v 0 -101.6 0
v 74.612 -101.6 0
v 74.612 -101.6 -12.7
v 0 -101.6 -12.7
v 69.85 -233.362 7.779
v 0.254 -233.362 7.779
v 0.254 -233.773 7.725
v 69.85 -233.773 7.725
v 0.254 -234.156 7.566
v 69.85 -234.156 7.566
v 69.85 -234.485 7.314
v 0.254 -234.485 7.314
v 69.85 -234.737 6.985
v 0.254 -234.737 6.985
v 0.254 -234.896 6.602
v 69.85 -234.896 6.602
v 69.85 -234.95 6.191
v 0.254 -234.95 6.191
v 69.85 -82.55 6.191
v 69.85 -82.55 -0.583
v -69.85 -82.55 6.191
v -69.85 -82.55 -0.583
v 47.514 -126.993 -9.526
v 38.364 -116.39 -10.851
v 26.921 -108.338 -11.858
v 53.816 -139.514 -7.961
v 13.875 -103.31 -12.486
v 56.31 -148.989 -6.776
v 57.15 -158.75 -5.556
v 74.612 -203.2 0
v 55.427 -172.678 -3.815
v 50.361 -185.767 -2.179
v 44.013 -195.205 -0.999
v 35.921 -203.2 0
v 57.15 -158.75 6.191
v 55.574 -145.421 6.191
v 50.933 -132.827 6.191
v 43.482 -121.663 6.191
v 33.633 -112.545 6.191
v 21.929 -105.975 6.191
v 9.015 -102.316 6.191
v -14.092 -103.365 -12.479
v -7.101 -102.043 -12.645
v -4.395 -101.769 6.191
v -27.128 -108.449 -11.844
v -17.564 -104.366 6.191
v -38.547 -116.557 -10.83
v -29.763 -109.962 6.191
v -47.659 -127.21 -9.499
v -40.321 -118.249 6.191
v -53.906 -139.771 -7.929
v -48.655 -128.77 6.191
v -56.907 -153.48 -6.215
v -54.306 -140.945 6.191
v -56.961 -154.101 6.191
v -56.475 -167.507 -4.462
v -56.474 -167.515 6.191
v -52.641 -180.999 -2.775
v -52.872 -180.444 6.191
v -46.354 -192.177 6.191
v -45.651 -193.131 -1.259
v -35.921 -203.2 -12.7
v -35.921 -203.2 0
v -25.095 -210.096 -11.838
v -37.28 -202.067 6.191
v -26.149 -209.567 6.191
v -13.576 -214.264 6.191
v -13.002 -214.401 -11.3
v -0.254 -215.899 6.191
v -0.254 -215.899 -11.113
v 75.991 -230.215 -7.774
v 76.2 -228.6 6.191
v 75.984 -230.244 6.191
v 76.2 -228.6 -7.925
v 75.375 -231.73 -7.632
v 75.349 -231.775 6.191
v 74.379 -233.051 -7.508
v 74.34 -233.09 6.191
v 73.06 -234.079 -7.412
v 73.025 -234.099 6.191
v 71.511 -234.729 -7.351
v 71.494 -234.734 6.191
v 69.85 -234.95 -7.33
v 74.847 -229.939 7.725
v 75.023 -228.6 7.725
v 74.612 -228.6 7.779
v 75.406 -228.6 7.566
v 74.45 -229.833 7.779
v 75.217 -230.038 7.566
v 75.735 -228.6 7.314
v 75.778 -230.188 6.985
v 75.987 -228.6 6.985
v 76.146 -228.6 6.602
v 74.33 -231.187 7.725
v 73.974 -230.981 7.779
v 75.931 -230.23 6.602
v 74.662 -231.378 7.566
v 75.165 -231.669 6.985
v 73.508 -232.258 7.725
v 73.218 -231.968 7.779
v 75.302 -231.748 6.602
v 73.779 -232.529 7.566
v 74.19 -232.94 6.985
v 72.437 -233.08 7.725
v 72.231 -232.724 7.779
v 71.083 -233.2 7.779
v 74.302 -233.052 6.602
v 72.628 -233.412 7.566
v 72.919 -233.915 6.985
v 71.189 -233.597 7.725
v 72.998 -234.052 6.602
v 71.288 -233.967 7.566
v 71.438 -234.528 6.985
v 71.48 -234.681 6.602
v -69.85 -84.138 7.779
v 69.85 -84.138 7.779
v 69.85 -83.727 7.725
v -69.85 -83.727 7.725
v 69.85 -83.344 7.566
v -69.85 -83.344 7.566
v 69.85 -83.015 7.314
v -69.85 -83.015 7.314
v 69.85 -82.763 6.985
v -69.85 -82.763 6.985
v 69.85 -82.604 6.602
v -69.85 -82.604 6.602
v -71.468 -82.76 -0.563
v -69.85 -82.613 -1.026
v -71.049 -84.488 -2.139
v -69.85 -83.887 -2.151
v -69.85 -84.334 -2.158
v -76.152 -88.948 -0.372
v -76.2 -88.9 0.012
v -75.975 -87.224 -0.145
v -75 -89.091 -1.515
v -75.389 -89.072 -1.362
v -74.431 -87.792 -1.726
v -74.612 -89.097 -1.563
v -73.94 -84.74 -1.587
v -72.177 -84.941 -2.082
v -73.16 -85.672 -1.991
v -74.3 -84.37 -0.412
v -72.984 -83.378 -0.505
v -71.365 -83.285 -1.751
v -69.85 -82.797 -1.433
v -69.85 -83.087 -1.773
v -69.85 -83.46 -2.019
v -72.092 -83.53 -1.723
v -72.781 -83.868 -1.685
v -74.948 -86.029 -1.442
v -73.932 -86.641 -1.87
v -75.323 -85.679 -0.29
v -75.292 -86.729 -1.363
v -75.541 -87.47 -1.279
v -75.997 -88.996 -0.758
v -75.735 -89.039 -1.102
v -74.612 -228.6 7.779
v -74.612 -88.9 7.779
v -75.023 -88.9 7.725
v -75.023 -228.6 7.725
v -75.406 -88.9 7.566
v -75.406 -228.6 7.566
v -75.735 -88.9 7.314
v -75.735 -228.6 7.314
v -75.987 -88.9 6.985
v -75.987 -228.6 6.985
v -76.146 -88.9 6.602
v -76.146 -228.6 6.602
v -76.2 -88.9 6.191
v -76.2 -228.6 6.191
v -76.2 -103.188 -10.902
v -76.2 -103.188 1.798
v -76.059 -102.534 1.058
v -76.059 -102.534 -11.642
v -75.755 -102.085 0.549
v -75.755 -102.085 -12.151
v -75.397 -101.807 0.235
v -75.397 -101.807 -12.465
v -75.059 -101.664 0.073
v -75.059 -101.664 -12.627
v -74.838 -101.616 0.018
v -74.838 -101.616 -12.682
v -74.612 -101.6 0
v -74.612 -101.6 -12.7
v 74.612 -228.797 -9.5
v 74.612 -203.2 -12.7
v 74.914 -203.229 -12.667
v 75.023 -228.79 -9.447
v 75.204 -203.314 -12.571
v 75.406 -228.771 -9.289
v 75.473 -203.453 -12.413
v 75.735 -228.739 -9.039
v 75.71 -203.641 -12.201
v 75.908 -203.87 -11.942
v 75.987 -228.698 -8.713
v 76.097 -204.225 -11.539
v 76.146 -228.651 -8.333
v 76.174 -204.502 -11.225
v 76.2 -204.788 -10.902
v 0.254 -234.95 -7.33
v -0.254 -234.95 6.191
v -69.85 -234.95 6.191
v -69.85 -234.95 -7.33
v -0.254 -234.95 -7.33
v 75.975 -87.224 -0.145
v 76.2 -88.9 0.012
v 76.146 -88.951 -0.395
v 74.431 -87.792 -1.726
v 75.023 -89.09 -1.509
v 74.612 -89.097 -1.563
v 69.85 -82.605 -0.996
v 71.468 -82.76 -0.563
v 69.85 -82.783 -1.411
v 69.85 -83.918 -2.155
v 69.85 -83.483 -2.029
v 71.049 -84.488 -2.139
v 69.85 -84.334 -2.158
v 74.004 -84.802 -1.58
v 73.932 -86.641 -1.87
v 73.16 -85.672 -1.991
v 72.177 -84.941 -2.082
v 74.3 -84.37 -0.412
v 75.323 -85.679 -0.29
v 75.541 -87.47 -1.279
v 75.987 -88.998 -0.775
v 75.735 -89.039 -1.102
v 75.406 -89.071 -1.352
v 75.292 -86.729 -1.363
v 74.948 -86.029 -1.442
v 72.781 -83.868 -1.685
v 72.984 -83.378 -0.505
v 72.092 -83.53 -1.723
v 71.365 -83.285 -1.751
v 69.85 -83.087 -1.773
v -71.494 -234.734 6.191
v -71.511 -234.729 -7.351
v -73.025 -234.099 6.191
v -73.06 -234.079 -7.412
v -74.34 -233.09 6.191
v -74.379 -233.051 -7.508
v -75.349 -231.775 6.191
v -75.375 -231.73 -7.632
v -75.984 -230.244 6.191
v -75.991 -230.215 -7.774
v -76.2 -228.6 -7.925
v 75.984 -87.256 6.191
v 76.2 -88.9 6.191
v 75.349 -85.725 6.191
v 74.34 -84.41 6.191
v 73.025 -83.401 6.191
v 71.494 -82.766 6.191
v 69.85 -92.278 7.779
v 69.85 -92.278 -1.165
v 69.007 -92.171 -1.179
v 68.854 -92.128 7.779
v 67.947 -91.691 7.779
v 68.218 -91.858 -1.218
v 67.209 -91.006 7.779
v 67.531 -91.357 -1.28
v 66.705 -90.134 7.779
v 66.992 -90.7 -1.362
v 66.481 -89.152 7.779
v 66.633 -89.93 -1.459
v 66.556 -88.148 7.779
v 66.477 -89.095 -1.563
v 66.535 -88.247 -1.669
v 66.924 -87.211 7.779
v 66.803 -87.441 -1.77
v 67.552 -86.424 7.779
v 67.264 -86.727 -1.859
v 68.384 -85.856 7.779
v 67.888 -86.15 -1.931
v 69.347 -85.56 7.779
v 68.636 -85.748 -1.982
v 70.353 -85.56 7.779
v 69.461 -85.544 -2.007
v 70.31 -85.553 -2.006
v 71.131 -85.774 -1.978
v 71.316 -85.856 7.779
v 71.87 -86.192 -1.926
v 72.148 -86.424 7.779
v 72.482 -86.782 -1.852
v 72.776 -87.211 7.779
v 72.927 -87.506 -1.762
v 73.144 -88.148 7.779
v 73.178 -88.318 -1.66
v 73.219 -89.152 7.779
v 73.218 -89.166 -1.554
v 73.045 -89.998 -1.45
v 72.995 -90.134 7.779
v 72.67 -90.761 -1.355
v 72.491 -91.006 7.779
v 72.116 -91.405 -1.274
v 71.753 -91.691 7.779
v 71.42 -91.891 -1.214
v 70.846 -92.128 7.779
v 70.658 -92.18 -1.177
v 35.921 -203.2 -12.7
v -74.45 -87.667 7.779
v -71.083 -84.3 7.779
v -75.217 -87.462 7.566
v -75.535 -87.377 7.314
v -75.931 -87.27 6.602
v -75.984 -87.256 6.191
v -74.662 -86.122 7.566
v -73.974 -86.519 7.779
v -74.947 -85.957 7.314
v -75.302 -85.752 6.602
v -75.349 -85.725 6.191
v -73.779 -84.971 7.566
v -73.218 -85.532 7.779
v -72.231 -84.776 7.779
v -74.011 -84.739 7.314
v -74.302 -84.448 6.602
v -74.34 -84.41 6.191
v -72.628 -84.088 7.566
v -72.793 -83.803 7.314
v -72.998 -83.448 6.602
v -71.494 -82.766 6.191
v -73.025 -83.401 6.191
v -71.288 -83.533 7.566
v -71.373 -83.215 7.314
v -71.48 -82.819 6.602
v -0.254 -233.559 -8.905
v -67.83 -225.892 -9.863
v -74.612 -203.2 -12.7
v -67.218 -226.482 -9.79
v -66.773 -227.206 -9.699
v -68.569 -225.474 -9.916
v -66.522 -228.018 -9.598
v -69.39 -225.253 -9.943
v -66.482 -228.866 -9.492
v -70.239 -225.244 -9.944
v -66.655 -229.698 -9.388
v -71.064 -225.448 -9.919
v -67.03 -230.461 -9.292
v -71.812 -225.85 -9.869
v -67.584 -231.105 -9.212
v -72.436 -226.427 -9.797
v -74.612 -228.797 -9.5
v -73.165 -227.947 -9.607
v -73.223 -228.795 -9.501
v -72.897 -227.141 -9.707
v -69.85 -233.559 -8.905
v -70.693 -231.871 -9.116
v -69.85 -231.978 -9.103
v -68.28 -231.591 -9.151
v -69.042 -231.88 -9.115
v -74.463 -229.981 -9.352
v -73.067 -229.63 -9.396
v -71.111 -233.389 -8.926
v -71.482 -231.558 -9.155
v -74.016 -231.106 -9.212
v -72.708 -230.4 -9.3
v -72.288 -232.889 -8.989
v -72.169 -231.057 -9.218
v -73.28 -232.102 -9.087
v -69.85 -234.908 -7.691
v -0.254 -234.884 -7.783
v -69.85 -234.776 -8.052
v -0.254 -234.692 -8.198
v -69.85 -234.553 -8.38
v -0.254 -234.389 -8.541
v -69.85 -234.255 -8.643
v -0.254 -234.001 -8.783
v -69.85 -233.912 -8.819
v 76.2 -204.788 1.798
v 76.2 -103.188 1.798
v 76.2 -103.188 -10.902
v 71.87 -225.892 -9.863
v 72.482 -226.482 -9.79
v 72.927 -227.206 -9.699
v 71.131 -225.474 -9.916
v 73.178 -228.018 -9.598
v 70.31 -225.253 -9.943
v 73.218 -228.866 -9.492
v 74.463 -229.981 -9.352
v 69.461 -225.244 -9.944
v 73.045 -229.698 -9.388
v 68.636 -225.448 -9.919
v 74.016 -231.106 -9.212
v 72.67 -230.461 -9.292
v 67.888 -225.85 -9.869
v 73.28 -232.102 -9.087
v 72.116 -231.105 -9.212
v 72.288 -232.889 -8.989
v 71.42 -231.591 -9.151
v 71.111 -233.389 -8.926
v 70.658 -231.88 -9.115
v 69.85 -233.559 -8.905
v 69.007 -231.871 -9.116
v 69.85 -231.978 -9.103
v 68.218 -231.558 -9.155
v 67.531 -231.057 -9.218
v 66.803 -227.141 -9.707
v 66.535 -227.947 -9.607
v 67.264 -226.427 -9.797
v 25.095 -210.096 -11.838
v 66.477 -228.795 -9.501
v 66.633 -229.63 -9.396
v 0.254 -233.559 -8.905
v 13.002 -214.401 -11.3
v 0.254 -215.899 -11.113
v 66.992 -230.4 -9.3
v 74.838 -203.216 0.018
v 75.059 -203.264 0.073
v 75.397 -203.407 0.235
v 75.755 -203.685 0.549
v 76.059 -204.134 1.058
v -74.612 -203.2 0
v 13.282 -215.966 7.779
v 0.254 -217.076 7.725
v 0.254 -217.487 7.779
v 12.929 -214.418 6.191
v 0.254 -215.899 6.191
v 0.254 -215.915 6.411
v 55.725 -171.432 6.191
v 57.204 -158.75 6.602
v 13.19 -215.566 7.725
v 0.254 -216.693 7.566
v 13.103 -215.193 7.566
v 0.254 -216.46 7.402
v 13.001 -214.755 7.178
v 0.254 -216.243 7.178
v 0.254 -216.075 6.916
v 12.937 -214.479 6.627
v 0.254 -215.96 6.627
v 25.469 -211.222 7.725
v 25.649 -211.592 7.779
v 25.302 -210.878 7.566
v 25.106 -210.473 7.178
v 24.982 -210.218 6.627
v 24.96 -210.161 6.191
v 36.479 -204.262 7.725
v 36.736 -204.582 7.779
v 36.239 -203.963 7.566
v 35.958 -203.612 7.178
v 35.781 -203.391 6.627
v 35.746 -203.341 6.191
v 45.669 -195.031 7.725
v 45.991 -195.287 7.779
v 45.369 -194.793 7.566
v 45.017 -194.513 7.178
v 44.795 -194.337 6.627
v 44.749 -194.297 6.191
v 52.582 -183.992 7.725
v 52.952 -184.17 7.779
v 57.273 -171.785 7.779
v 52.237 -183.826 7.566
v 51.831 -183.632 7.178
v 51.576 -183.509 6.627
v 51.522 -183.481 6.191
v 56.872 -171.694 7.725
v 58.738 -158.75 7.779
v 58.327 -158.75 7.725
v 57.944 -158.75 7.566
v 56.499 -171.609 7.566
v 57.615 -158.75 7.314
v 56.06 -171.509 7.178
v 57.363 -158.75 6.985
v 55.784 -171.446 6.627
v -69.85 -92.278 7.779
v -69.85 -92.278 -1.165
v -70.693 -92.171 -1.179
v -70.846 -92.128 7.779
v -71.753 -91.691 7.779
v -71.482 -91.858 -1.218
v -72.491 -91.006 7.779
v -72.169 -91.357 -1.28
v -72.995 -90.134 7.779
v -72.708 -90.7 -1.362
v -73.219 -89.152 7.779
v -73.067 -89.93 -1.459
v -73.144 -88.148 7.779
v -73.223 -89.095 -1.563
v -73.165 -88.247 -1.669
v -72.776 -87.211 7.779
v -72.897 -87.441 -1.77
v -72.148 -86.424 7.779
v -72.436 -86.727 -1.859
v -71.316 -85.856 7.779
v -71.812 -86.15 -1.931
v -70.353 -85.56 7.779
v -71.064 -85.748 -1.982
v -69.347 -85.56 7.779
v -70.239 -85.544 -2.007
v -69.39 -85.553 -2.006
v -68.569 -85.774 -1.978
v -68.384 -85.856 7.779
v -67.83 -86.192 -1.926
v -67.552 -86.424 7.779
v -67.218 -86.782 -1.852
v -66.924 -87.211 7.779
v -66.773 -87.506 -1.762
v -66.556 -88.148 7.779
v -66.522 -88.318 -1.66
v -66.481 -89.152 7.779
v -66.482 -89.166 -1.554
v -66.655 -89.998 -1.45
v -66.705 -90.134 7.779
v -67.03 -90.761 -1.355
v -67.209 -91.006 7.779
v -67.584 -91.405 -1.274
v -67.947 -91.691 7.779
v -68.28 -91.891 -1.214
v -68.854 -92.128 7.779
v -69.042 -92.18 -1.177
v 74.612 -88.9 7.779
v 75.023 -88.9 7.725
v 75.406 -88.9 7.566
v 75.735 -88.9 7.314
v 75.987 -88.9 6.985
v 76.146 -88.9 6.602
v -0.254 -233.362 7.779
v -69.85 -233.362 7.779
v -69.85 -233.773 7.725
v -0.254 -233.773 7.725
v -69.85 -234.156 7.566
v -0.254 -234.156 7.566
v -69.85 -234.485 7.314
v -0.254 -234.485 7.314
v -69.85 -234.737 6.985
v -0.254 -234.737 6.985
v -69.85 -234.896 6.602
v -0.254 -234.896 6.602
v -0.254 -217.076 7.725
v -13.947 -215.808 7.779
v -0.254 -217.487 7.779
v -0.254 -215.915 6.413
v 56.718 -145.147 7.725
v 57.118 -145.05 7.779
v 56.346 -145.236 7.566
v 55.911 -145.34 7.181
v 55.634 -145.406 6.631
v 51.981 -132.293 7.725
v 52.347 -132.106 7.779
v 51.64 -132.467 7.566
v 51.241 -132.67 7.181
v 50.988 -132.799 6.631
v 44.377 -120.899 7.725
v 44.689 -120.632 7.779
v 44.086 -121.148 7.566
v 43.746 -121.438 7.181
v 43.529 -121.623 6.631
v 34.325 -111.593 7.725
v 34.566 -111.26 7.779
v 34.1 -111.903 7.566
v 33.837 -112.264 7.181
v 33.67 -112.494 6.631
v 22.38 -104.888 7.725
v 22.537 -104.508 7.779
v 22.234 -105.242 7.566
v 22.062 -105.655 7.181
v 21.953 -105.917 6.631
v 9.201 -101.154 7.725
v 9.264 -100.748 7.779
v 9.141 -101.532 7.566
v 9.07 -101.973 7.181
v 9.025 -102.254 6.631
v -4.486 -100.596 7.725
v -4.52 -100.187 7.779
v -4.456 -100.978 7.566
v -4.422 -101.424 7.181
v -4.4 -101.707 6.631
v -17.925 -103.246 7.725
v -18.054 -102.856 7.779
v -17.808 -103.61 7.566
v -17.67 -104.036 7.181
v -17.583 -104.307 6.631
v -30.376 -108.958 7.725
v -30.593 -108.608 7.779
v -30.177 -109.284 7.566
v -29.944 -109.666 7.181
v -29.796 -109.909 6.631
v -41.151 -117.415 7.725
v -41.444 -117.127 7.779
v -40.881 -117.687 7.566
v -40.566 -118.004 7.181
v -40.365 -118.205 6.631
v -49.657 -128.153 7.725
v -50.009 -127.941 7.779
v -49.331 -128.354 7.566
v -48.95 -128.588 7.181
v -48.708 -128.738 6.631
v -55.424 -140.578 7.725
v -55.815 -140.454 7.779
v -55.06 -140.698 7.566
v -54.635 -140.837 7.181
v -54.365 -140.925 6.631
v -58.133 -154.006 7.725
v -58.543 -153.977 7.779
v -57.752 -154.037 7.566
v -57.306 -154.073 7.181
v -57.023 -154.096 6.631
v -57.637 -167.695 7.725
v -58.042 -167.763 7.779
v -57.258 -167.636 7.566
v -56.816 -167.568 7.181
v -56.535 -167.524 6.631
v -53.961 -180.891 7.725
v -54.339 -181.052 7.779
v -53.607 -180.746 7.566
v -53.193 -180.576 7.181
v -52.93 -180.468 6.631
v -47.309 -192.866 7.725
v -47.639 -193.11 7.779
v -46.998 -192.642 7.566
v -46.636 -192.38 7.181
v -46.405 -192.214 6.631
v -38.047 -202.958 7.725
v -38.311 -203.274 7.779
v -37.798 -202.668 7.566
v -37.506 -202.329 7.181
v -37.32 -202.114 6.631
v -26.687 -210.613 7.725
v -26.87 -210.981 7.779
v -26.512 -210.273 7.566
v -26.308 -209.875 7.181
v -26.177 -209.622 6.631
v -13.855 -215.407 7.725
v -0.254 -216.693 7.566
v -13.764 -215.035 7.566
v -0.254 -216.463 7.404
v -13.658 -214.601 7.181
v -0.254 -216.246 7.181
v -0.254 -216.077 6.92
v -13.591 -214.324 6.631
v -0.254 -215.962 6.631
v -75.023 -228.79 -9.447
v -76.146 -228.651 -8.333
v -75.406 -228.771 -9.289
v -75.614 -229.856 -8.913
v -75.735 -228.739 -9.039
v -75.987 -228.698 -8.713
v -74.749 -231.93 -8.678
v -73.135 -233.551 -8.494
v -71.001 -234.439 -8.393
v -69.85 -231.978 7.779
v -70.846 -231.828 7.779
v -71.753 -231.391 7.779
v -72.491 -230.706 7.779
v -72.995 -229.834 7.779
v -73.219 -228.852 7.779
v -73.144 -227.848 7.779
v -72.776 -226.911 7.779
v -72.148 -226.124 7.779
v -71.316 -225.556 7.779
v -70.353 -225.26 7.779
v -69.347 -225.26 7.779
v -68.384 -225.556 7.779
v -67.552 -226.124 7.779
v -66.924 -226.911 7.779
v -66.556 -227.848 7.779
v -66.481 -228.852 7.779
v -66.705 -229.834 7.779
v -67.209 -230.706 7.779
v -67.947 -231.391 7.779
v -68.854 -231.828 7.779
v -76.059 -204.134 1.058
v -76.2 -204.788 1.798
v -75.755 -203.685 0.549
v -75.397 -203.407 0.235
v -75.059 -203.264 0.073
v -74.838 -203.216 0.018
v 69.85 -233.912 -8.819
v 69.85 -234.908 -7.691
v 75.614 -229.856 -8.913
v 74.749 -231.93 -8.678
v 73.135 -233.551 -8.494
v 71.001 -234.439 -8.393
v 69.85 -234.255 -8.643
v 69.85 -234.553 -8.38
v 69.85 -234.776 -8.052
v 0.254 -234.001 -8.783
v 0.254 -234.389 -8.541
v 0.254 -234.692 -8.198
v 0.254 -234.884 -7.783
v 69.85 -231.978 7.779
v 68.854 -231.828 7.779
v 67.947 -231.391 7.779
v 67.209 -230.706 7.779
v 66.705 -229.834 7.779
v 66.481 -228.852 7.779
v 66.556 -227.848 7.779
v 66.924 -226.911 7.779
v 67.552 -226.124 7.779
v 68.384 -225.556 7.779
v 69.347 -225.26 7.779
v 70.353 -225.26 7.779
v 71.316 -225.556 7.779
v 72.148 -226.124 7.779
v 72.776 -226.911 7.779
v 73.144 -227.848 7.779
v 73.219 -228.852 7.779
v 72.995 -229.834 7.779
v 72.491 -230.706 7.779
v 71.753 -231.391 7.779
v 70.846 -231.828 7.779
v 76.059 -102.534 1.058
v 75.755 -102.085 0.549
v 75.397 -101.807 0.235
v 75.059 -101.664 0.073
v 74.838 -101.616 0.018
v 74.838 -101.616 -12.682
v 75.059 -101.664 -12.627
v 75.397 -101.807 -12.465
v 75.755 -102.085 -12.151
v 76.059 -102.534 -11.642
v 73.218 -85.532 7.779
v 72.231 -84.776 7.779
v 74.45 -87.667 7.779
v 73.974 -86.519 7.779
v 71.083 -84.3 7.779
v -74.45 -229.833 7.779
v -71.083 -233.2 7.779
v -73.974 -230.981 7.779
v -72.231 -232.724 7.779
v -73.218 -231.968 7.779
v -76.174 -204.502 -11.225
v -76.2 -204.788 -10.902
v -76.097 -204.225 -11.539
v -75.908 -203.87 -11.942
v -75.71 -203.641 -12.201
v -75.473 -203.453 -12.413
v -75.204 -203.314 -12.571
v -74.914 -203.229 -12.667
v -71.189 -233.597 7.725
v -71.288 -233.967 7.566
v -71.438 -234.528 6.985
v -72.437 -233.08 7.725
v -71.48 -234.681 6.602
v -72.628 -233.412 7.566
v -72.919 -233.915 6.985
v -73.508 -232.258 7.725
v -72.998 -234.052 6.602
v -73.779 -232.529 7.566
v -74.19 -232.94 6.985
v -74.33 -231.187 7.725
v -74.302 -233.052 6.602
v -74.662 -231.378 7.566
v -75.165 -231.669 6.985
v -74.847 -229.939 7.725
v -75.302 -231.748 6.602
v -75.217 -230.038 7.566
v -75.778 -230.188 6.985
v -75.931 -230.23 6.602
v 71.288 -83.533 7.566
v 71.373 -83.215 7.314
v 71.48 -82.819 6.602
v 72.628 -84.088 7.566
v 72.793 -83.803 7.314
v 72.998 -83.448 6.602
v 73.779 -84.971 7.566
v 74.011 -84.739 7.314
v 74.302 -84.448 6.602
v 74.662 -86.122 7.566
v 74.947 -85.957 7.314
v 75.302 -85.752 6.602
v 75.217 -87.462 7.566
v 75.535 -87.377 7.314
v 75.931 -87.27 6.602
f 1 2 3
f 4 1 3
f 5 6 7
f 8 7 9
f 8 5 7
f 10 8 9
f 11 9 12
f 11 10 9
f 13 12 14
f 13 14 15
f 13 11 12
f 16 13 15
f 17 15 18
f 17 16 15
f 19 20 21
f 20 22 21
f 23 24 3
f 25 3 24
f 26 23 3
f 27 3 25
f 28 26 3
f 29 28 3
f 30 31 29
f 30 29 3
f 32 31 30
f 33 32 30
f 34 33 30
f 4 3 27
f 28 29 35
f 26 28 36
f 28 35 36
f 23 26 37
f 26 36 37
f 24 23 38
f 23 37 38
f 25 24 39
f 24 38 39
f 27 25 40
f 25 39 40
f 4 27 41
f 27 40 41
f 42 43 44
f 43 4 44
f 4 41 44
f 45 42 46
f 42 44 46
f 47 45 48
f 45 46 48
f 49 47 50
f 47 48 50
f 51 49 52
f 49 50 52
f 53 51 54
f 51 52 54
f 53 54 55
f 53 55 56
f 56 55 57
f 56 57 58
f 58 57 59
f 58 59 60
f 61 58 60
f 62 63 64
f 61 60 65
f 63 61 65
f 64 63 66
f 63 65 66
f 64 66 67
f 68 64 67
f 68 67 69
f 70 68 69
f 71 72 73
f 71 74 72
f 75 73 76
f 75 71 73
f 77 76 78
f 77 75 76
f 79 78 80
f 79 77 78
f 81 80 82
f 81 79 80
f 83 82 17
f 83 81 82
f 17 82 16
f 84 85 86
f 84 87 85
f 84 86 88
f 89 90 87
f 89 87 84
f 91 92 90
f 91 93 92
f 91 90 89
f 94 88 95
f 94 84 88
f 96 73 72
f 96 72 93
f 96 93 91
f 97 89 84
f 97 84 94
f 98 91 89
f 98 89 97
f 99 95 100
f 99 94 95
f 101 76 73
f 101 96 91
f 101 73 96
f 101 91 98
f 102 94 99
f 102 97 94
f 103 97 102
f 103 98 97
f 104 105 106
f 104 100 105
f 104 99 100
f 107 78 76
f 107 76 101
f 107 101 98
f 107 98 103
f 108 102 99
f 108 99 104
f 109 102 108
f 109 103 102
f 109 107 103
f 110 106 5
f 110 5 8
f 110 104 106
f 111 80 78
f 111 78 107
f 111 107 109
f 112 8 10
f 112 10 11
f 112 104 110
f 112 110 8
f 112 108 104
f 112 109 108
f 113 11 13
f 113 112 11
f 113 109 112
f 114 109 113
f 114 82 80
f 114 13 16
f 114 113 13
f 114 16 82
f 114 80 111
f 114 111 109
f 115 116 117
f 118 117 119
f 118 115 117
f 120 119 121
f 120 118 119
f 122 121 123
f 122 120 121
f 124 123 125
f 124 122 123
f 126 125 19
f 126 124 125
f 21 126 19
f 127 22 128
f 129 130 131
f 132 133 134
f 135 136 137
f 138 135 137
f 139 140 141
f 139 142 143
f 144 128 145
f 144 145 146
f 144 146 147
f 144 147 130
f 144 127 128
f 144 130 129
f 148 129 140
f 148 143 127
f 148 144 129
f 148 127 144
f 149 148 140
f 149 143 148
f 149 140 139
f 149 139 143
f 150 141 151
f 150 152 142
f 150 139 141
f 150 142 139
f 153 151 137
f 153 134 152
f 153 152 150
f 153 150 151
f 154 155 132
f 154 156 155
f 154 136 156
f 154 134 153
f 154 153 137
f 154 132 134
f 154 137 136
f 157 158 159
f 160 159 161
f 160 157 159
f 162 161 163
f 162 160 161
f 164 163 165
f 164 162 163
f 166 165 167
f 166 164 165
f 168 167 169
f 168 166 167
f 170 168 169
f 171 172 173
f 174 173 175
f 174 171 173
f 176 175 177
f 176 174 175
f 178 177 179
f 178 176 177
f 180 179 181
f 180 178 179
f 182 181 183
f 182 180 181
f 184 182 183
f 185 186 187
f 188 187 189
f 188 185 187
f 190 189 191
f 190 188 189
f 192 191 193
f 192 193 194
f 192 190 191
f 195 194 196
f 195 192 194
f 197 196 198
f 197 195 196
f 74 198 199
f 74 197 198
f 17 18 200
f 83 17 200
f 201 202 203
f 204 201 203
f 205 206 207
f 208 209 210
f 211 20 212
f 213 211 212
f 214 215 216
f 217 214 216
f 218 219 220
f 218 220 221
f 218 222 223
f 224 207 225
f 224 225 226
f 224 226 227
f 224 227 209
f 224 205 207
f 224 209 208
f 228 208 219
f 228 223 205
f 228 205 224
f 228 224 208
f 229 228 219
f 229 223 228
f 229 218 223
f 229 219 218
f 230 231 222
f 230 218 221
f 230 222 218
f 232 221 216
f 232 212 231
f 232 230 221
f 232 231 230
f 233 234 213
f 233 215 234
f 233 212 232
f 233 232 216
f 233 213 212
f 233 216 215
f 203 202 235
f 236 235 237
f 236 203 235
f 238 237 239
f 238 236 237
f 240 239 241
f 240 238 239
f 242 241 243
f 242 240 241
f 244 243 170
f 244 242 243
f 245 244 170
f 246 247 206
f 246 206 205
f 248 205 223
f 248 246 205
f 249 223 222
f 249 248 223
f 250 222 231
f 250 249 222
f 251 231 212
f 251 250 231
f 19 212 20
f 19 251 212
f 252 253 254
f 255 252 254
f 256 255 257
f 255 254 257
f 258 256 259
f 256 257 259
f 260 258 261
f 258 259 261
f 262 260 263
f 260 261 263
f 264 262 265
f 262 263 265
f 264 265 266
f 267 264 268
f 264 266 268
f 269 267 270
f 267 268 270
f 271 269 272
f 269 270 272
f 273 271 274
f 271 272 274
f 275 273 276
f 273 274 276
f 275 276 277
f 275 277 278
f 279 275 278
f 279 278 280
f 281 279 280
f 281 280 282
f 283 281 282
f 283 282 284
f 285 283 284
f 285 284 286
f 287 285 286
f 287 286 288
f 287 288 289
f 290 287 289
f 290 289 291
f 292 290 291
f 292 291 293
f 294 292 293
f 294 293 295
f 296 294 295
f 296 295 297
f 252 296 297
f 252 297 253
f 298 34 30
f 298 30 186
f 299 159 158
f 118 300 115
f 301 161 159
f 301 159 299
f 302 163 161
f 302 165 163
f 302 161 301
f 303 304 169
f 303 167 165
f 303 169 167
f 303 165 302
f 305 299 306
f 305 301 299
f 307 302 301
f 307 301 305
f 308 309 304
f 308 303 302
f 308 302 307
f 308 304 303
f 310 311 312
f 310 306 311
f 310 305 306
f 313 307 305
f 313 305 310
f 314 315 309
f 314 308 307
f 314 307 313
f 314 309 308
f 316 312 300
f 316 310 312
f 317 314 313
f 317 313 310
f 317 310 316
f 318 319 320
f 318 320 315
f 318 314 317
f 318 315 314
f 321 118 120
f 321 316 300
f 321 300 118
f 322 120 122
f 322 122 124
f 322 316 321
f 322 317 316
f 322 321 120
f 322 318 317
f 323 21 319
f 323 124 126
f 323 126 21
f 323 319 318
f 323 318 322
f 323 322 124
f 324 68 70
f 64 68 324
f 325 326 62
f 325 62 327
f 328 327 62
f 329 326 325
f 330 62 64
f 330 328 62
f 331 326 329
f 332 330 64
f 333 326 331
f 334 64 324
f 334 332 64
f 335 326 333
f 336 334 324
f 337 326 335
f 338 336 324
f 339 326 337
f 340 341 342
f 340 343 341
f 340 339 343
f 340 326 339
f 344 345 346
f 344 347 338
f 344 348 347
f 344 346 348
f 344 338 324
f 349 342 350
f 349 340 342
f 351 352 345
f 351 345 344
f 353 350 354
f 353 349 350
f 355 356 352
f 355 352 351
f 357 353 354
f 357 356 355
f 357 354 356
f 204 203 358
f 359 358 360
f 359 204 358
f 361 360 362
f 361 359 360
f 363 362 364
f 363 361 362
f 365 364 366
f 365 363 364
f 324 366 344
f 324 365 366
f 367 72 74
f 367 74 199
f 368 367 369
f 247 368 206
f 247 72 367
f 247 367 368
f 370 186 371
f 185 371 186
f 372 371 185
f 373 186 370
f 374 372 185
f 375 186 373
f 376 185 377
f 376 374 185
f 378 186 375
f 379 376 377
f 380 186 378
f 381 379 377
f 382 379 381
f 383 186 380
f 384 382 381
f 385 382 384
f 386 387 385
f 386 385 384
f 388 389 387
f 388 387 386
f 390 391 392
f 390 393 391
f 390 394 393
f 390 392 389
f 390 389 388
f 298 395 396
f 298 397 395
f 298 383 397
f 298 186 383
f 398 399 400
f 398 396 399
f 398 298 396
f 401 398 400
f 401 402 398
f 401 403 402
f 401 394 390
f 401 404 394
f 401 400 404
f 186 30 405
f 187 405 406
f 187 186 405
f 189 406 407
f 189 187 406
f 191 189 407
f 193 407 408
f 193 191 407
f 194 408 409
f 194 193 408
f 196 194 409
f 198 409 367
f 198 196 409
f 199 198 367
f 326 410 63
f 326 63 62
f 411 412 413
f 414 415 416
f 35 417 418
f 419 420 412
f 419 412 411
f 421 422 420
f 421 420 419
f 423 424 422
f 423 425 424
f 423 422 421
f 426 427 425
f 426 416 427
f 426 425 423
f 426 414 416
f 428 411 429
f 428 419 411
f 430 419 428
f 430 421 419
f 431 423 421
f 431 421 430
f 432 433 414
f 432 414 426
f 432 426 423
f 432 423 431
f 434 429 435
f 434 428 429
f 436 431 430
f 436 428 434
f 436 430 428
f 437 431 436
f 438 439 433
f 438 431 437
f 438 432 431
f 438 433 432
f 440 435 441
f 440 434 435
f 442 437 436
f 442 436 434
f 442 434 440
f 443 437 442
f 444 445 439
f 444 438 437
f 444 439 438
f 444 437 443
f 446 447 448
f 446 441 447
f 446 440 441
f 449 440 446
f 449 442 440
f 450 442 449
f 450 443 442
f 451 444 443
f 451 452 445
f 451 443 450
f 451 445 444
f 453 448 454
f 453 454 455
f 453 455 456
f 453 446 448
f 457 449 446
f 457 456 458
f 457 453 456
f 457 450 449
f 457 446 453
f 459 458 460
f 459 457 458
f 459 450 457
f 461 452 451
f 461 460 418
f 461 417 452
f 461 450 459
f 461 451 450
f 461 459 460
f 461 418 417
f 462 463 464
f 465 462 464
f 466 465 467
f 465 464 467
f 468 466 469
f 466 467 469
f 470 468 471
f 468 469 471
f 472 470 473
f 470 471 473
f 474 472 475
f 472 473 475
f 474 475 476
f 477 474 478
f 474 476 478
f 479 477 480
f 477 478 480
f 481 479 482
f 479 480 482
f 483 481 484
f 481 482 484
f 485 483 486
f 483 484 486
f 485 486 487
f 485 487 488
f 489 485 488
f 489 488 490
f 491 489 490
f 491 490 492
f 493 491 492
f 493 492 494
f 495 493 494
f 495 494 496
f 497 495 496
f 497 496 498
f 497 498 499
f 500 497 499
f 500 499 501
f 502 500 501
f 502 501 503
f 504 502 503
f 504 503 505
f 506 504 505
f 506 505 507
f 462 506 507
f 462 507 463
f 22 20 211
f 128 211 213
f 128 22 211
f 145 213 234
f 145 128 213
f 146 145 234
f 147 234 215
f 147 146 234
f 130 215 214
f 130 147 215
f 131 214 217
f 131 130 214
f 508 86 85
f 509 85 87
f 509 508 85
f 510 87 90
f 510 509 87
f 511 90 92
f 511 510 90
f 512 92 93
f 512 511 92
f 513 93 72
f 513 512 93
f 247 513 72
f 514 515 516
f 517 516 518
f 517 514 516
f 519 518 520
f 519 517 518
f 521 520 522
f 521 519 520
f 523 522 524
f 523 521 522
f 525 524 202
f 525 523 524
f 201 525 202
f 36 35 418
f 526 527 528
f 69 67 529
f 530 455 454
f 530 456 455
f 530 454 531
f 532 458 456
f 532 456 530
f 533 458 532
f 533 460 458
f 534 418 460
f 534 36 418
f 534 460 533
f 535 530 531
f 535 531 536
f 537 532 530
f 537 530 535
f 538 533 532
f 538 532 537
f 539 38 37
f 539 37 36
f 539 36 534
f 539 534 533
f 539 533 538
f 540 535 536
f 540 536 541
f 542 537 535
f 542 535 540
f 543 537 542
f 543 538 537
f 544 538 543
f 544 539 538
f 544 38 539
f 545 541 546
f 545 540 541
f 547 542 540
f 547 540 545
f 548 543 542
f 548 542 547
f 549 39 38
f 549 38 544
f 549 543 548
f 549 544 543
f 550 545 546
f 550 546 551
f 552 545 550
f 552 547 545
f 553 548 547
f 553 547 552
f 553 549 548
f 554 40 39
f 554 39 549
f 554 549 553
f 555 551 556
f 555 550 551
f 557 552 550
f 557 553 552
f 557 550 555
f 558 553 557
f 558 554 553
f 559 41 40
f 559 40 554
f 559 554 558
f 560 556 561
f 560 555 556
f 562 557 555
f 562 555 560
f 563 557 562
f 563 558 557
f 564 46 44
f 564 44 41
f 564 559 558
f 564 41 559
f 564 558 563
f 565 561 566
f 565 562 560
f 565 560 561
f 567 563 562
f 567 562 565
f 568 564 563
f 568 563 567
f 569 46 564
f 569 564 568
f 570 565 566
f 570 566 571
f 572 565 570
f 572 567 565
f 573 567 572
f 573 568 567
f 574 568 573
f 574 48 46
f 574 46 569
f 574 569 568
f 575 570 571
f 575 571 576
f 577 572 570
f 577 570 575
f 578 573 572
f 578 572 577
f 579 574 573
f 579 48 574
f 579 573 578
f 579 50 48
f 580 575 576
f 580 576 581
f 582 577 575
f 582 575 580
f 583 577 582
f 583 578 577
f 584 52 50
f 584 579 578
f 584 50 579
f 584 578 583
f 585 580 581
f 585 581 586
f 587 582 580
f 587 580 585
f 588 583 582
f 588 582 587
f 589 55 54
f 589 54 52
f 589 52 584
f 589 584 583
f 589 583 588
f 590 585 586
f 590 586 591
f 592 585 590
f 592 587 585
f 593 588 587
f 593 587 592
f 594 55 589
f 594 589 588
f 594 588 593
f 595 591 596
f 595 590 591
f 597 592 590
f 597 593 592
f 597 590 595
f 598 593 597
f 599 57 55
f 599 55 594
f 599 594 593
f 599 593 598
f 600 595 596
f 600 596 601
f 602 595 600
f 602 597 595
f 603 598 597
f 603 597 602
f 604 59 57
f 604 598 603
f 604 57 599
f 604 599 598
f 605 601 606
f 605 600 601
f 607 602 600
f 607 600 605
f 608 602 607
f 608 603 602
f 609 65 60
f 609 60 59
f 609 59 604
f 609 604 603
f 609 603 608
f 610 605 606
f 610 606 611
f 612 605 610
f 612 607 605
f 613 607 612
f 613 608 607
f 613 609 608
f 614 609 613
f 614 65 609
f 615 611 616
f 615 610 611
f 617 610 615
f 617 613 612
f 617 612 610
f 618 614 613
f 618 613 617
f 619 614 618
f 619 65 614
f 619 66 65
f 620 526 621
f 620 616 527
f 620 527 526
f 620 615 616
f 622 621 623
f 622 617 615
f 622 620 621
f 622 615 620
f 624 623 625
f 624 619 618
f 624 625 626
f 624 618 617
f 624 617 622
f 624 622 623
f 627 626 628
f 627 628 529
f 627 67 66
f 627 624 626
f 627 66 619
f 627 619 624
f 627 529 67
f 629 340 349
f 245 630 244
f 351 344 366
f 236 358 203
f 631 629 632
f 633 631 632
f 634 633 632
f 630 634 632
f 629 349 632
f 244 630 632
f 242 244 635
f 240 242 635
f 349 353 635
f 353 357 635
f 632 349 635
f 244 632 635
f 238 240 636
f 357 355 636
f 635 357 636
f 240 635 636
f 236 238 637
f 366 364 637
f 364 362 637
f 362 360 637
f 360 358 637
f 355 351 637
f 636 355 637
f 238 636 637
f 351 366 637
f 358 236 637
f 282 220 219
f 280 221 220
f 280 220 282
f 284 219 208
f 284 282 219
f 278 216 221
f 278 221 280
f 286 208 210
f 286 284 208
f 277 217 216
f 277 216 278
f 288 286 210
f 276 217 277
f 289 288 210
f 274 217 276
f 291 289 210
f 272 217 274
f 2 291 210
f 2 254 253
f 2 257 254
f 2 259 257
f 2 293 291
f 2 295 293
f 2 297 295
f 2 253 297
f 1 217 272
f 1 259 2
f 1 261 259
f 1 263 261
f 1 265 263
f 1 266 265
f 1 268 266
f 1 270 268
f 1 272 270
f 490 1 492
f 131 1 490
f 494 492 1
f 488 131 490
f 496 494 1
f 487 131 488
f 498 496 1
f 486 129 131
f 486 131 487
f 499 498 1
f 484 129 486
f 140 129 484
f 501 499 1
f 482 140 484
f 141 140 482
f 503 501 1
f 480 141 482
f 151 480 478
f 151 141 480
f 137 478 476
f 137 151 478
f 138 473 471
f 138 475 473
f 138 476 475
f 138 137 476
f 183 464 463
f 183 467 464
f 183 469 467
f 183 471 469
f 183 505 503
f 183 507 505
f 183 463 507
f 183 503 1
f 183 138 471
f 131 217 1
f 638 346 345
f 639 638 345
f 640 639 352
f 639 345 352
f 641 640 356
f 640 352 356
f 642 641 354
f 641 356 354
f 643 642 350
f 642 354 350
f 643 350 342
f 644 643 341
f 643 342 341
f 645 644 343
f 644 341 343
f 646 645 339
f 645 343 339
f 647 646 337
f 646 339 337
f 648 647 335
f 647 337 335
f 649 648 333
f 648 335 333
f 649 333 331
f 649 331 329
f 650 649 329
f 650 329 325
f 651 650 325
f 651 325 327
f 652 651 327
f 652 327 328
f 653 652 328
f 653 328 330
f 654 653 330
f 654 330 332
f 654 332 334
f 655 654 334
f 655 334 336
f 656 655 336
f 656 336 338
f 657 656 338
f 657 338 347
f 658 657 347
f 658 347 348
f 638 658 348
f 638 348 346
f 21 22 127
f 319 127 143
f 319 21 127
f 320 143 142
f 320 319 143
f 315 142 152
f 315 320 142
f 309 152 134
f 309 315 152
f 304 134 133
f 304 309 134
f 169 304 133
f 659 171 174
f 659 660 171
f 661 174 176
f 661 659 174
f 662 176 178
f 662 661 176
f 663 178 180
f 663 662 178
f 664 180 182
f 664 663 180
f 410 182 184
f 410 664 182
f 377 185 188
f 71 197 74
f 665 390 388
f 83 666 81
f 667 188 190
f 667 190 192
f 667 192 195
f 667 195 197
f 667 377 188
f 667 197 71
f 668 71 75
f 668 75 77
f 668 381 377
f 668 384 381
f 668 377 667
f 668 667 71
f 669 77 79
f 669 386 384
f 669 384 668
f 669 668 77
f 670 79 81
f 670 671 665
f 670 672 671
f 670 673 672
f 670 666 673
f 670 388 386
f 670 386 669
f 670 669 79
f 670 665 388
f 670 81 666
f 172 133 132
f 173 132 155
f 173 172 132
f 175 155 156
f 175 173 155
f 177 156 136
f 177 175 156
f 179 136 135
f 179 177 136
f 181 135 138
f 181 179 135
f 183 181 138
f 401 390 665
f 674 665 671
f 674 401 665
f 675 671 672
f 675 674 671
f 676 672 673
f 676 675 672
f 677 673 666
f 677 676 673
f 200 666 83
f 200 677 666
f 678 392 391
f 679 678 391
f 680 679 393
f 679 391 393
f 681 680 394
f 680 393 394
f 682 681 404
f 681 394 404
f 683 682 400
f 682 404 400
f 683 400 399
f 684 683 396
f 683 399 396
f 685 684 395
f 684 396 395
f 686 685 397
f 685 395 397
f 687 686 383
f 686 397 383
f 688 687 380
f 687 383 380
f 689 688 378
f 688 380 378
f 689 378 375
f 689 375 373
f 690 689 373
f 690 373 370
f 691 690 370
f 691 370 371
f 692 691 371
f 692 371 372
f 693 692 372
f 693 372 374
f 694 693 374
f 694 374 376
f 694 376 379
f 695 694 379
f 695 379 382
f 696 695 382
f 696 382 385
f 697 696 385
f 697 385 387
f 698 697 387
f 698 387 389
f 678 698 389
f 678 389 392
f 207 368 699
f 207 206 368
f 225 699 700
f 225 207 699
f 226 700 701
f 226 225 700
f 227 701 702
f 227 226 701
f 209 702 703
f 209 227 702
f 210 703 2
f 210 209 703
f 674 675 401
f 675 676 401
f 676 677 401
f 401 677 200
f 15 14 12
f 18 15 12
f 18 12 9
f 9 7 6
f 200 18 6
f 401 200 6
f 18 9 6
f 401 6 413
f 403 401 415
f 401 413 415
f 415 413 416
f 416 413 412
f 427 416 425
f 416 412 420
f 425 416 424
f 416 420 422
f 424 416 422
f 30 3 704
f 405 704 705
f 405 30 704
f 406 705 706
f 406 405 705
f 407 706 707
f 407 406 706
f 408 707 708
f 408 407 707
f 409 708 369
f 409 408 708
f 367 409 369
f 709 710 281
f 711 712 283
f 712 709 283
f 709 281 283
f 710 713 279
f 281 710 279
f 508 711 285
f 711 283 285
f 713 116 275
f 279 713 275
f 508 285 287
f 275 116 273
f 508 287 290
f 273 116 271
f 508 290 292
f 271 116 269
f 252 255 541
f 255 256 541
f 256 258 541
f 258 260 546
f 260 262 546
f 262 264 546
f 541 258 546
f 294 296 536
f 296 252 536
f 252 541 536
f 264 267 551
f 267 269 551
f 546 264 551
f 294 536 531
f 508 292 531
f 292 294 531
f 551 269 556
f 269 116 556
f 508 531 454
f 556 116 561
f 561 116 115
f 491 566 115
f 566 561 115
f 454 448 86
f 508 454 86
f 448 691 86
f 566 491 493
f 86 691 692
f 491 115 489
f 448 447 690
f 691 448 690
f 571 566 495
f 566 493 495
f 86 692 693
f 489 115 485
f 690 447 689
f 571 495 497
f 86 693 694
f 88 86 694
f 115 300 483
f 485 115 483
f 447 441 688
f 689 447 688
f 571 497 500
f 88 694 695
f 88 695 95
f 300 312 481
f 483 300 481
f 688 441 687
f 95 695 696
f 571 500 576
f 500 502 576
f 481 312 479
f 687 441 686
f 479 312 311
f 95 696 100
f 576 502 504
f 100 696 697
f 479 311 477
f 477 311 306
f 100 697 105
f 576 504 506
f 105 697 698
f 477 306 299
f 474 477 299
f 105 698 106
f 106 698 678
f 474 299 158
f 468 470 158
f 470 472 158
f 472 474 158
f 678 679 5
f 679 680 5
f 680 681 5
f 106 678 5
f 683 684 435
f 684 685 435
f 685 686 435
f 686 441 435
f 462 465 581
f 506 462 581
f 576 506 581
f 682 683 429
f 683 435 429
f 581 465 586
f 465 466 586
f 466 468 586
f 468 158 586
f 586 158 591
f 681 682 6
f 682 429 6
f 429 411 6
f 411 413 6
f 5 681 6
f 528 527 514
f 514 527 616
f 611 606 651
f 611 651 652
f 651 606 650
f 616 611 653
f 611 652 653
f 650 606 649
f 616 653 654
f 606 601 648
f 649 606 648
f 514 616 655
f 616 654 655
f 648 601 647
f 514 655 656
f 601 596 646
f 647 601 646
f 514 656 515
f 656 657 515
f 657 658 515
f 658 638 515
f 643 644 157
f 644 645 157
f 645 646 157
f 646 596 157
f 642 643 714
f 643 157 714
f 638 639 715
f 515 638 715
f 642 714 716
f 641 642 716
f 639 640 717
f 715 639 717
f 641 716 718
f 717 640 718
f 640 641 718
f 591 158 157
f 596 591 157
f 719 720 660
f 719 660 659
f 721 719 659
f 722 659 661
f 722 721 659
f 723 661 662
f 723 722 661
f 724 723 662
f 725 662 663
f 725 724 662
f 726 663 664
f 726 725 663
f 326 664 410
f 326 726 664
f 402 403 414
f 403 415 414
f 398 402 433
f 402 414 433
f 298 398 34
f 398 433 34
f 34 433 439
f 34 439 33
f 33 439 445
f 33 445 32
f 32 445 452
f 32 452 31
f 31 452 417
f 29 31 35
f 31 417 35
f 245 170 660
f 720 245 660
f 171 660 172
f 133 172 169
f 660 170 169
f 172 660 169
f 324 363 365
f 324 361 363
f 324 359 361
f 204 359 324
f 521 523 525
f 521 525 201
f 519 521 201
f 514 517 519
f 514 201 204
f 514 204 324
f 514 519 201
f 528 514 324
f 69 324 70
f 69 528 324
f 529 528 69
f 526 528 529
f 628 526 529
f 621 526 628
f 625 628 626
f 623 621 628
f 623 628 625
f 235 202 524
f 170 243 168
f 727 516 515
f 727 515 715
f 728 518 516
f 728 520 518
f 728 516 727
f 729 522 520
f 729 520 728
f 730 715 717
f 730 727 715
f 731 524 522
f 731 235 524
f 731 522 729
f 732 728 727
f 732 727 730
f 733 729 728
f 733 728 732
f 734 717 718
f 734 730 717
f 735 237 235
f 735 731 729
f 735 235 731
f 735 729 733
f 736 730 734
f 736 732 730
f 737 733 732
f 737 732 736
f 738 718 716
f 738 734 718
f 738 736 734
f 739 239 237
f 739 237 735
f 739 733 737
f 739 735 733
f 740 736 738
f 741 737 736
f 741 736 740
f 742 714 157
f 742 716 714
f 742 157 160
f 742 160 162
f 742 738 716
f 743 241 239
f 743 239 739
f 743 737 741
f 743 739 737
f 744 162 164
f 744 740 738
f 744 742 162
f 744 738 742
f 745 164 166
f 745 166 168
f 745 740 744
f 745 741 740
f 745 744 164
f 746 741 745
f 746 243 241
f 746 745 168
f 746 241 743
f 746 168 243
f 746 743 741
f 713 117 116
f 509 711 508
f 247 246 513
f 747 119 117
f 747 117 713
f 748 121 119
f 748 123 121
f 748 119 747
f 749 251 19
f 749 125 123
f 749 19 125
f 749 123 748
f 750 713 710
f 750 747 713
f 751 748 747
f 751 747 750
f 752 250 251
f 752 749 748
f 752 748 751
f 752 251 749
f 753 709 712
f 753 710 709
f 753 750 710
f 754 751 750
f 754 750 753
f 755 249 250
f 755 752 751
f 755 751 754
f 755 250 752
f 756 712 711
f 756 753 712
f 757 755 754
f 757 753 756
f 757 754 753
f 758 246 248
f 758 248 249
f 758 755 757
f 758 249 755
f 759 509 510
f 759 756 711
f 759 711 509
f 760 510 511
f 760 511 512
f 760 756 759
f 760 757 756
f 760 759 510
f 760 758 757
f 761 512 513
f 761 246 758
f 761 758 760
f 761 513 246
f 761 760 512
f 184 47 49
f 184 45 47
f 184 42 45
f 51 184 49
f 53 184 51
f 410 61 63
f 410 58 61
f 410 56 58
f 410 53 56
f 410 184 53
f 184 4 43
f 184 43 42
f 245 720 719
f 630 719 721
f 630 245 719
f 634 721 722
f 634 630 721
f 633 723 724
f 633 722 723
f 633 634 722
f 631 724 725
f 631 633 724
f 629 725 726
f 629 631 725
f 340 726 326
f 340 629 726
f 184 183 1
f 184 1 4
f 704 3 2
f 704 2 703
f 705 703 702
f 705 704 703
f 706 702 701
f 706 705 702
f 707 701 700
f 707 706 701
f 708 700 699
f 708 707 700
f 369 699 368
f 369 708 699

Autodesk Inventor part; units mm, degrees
ref_plane "YZ Plane" through (0, 0, 0) normal (1, 0, 0) x (0, 1, 0)
ref_plane "XZ Plane" through (0, 0, 0) normal (0, 1, 0) x (-1, 0, 0)
ref_plane "XY Plane" through (0, 0, 0) normal (0, 0, 1) x (1, 0, 0)
sketch "Sketch4" plane through (0, 0, 0) normal (1, 0, 0) x (0, 1, 0)
  line L0 (0, 0) -> (0, -12.7)
  line L1 (0, -12.7) -> (-101.6, 0)
  line L2 (-101.6, 0) -> (-101.6, -12.7)
  line L3 (-101.6, -12.7) -> (-203.2, 0)
  line L4 (-203.2, 0) -> (-203.2, -12.7)
  line L5 (-203.2, -12.7) -> (-304.8, 0)
  line L6 (-82.55, -2.3812) -> (-82.55, 7.7787)
  line L7 (-82.55, 7.7787) -> (-234.95, 7.7787)
  line L8 (-234.95, 7.7787) -> (-234.95, -8.7313)
  dimension "d28" = 12.7
  dimension "d29" = 101.6
  dimension "d30" = 101.6
  dimension "d31" = 12.7
  dimension "d32" = 101.6
  dimension "d33" = 152.4
  dimension "d34" = 10.16
  dimension "d35" = 19.05
extrude "Extrusion3" add sketch "Sketch4" along normal mid plane 152.4
sketch "Sketch5" plane through (-76.2, -234.95, 7.7787) normal (0, 0, 1) x (1, 0, 0)
  line L0 (0, 0) -> (0, 152.4) construction
  line L1 (0, 152.4) -> (152.3647, 0) construction
  line L2 (152.4, 152.4) -> (152.4, 0) construction
  line L3 (0, 0) -> (152.4, 0) construction
  line L4 (152.4, 152.4) -> (0, 0) construction
  line L5 (6.35, 6.35) -> (146.05, 6.35) construction
  line L6 (146.05, 6.35) -> (146.05, 146.05) construction
  line L7 (146.05, 146.05) -> (6.35, 146.05) construction
  line L8 (6.35, 146.05) -> (6.35, 6.35) construction
  line L9 (6.35, 6.35) -> (146.05, 146.05) construction
  line L10 (146.05, 6.35) -> (6.35, 146.05) construction
  line L11 (0, 152.4) -> (152.4, 152.4) construction
  circle A0 centre (76.2, 76.2) radius 57.15
  line L12 (76.2, 19.05) -> (76.2, 0) construction
  line L13 (0, 0) -> (152.4, 0) construction
  line L14 (76.454, 0) -> (76.454, 19.0506)
  line L15 (75.946, 0) -> (75.946, 19.0506)
  line L16 (75.946, 0) -> (76.454, 0)
  point P0 (76.2, 234.95)
  point P1 (75.946, 19.0506)
  dimension "d38" = 6.35
  dimension "d39" = 6.35
  dimension "d40" = 114.3
  dimension "d51" = 0.254
extrude "Extrusion4" cut sketch "Sketch5" against normal through all contours A0
hole "Hole2" at (-69.85, -88.9, 7.7787) at (69.85, -88.9, 7.7787) at (69.85, -228.6, 7.7787) at (-69.85, -228.6, 7.7787) direction (0, 0, -1) diameter 6.7564 end through all clearance for "Hex Machine Screw" size "1/4" standard "Ansi Unified Screw Threads"
fillet "Fillet2" radius 6.35 4 edges at (76.2, -82.55, 2.6987) (-76.2, -82.55, 2.6987) (76.2, -234.95, -0.4763) (-76.2, -234.95, -0.4763)
extrude "Extrusion5" cut sketch "Sketch5" against normal through all contours A0 L14 L16 L15
fillet "Fillet3" radius 1.5875 2 edges at (40.5009, -199.0712, 7.7787) (-40.3212, -118.2491, 7.7787)
fillet "Fillet4" radius 1.5875 9 edges at (74.3401, -84.4099, 7.7787) (76.2, -158.75, 7.7787) (74.3401, -233.0901, 7.7787) (35.052, -234.95, 7.7787) (-74.3401, -84.4099, 7.7787) (-76.2, -158.75, 7.7787) (-74.3401, -233.0901, 7.7787) (-35.052, -234.95, 7.7787) (0, -82.55, 7.7787)
fillet "Fillet5" radius 1.5875 17 edges at (76.2, -152.4, -6.35) (-76.2, -152.4, -6.35) (-74.3401, -233.0901, -8.9637) (-35.052, -234.95, -8.7313) (-76.2, -215.9, -11.1125) (74.3401, -233.0901, -8.9637) (35.052, -234.95, -8.7313) (76.2, -215.9, -11.1125) (76.2, -203.2, -6.35) (-76.2, -203.2, -6.35) (-76.2, -101.6, -6.35) (76.2, -101.6, -6.35) (74.3401, -84.4099, -2.1488) (76.2, -95.25, -0.7937) (-74.3401, -84.4099, -2.1488) (-76.2, -95.25, -0.7937) (0, -82.55, -2.3812)
equation "\"d36\" = outsideWidthOfVent"
equation "\"d40\" = ventHole"
equation "\"d50\" = ventRadius"
equation "\"sidingHeight\" = 101.6"
equation "\"sidingDepth\" = 12.7"
equation "\"radiusOfCurvature\" = 609.6"
equation "\"outsideWidthOfVent\" = 152.4"
equation "\"wallThicknessOfVent\" = 19.05"
equation "\"holeOffset\" = 6.35"
equation "\"ventHole\" = 114.3"
equation "\"ventRadius\" = 6.35"
properties part number "ventForDryer02"
